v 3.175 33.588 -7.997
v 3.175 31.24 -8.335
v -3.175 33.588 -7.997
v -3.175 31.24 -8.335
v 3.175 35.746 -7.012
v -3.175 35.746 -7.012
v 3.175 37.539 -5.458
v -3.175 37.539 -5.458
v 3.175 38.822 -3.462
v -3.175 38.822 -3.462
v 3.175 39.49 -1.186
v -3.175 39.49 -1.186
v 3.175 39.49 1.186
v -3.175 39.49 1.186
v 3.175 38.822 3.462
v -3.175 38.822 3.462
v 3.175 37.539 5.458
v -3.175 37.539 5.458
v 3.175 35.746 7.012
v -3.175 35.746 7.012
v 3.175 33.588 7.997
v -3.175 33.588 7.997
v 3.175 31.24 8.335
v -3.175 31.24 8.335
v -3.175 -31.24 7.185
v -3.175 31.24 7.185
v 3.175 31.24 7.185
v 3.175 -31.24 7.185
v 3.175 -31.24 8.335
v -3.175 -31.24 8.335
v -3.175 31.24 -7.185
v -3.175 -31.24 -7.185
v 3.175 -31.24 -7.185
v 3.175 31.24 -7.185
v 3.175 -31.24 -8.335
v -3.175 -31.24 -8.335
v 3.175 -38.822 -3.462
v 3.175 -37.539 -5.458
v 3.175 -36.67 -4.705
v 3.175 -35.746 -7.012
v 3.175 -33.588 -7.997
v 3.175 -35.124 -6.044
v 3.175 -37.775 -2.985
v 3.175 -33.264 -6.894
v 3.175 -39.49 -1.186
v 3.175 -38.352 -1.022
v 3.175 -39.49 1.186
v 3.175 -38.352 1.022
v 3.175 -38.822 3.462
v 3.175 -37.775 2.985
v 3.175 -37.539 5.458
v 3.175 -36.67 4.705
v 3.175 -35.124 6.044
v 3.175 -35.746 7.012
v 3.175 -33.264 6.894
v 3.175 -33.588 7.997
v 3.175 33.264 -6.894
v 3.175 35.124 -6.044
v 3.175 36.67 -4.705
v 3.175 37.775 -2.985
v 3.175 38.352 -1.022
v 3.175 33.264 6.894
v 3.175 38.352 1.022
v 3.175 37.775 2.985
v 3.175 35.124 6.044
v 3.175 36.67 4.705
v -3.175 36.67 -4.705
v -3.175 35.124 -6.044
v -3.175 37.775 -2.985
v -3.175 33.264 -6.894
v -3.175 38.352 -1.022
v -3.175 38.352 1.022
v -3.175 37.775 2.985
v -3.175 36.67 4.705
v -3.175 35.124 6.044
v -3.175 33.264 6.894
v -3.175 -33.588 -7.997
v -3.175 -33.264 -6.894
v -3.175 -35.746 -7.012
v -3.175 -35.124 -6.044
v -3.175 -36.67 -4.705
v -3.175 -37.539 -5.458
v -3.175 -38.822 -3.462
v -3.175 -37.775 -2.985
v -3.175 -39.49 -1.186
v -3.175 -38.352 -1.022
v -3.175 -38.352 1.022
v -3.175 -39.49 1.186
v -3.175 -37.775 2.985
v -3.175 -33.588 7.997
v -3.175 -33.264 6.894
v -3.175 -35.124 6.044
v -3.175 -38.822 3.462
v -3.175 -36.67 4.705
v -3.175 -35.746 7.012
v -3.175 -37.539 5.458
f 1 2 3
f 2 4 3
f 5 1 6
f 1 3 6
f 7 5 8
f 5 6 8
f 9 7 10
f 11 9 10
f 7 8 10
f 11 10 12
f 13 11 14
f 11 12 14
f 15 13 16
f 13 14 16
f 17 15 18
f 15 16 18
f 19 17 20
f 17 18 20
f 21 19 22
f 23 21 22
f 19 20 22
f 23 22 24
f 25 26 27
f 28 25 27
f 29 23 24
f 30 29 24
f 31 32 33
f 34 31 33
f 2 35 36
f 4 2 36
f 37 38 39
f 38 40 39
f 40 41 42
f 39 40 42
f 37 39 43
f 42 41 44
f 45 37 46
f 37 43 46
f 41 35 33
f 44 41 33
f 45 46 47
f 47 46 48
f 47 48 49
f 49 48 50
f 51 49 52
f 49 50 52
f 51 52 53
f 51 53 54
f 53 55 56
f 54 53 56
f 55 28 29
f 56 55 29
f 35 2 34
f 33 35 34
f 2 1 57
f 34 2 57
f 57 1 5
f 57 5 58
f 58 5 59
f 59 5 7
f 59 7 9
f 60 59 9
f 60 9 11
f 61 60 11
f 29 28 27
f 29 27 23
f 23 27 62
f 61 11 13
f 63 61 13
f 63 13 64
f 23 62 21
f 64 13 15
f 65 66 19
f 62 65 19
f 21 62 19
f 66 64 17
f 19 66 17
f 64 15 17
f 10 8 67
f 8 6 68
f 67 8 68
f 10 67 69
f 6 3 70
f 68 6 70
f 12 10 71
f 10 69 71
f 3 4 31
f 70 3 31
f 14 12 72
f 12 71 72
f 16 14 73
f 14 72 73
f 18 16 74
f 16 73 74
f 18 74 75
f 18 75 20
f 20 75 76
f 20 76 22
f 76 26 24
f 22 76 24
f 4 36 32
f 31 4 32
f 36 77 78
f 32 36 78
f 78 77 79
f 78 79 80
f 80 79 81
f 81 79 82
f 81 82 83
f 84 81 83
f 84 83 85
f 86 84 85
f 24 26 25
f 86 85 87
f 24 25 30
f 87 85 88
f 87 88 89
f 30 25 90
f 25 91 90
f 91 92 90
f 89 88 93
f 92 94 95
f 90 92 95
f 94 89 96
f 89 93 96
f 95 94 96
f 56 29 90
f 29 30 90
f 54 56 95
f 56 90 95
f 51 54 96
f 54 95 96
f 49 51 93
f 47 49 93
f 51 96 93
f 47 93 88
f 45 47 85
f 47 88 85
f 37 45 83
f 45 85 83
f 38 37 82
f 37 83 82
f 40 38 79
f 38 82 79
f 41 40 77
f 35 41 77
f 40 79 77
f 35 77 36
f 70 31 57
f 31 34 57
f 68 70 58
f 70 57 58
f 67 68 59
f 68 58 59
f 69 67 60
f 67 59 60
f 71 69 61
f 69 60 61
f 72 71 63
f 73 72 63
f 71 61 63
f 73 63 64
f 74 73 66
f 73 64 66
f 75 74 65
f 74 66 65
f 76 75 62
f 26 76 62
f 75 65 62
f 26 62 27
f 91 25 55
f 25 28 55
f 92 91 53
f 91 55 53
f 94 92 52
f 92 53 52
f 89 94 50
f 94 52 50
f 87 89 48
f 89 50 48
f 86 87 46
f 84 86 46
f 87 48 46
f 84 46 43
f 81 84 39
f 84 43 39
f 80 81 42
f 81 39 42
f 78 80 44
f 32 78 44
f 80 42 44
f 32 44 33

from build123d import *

# Parameters (mm, degrees)
F1_W = 6.35
F1_H = 1.15


with BuildPart() as f2:
    # F2: sweep along a path in F0
    with BuildLine(Plane.YZ) as f2_path:
        ThreePointArc((31.24, -7.7597), (38.9997, 0), (31.24, 7.7597))
        Line((31.24, 7.7597), (-31.24, 7.7597))
        ThreePointArc((-31.24, 7.7597), (-38.9997, 0), (-31.24, -7.7597))
        Line((-31.24, -7.7597), (31.24, -7.7597))
    # F1 (on Front) → F2 (sweep)
    with BuildSketch(Plane.XZ):
        with Locations((0, 7.7597)):
            Rectangle(F1_W, F1_H)
    sweep(path=f2_path.line)


solid = f2.part
